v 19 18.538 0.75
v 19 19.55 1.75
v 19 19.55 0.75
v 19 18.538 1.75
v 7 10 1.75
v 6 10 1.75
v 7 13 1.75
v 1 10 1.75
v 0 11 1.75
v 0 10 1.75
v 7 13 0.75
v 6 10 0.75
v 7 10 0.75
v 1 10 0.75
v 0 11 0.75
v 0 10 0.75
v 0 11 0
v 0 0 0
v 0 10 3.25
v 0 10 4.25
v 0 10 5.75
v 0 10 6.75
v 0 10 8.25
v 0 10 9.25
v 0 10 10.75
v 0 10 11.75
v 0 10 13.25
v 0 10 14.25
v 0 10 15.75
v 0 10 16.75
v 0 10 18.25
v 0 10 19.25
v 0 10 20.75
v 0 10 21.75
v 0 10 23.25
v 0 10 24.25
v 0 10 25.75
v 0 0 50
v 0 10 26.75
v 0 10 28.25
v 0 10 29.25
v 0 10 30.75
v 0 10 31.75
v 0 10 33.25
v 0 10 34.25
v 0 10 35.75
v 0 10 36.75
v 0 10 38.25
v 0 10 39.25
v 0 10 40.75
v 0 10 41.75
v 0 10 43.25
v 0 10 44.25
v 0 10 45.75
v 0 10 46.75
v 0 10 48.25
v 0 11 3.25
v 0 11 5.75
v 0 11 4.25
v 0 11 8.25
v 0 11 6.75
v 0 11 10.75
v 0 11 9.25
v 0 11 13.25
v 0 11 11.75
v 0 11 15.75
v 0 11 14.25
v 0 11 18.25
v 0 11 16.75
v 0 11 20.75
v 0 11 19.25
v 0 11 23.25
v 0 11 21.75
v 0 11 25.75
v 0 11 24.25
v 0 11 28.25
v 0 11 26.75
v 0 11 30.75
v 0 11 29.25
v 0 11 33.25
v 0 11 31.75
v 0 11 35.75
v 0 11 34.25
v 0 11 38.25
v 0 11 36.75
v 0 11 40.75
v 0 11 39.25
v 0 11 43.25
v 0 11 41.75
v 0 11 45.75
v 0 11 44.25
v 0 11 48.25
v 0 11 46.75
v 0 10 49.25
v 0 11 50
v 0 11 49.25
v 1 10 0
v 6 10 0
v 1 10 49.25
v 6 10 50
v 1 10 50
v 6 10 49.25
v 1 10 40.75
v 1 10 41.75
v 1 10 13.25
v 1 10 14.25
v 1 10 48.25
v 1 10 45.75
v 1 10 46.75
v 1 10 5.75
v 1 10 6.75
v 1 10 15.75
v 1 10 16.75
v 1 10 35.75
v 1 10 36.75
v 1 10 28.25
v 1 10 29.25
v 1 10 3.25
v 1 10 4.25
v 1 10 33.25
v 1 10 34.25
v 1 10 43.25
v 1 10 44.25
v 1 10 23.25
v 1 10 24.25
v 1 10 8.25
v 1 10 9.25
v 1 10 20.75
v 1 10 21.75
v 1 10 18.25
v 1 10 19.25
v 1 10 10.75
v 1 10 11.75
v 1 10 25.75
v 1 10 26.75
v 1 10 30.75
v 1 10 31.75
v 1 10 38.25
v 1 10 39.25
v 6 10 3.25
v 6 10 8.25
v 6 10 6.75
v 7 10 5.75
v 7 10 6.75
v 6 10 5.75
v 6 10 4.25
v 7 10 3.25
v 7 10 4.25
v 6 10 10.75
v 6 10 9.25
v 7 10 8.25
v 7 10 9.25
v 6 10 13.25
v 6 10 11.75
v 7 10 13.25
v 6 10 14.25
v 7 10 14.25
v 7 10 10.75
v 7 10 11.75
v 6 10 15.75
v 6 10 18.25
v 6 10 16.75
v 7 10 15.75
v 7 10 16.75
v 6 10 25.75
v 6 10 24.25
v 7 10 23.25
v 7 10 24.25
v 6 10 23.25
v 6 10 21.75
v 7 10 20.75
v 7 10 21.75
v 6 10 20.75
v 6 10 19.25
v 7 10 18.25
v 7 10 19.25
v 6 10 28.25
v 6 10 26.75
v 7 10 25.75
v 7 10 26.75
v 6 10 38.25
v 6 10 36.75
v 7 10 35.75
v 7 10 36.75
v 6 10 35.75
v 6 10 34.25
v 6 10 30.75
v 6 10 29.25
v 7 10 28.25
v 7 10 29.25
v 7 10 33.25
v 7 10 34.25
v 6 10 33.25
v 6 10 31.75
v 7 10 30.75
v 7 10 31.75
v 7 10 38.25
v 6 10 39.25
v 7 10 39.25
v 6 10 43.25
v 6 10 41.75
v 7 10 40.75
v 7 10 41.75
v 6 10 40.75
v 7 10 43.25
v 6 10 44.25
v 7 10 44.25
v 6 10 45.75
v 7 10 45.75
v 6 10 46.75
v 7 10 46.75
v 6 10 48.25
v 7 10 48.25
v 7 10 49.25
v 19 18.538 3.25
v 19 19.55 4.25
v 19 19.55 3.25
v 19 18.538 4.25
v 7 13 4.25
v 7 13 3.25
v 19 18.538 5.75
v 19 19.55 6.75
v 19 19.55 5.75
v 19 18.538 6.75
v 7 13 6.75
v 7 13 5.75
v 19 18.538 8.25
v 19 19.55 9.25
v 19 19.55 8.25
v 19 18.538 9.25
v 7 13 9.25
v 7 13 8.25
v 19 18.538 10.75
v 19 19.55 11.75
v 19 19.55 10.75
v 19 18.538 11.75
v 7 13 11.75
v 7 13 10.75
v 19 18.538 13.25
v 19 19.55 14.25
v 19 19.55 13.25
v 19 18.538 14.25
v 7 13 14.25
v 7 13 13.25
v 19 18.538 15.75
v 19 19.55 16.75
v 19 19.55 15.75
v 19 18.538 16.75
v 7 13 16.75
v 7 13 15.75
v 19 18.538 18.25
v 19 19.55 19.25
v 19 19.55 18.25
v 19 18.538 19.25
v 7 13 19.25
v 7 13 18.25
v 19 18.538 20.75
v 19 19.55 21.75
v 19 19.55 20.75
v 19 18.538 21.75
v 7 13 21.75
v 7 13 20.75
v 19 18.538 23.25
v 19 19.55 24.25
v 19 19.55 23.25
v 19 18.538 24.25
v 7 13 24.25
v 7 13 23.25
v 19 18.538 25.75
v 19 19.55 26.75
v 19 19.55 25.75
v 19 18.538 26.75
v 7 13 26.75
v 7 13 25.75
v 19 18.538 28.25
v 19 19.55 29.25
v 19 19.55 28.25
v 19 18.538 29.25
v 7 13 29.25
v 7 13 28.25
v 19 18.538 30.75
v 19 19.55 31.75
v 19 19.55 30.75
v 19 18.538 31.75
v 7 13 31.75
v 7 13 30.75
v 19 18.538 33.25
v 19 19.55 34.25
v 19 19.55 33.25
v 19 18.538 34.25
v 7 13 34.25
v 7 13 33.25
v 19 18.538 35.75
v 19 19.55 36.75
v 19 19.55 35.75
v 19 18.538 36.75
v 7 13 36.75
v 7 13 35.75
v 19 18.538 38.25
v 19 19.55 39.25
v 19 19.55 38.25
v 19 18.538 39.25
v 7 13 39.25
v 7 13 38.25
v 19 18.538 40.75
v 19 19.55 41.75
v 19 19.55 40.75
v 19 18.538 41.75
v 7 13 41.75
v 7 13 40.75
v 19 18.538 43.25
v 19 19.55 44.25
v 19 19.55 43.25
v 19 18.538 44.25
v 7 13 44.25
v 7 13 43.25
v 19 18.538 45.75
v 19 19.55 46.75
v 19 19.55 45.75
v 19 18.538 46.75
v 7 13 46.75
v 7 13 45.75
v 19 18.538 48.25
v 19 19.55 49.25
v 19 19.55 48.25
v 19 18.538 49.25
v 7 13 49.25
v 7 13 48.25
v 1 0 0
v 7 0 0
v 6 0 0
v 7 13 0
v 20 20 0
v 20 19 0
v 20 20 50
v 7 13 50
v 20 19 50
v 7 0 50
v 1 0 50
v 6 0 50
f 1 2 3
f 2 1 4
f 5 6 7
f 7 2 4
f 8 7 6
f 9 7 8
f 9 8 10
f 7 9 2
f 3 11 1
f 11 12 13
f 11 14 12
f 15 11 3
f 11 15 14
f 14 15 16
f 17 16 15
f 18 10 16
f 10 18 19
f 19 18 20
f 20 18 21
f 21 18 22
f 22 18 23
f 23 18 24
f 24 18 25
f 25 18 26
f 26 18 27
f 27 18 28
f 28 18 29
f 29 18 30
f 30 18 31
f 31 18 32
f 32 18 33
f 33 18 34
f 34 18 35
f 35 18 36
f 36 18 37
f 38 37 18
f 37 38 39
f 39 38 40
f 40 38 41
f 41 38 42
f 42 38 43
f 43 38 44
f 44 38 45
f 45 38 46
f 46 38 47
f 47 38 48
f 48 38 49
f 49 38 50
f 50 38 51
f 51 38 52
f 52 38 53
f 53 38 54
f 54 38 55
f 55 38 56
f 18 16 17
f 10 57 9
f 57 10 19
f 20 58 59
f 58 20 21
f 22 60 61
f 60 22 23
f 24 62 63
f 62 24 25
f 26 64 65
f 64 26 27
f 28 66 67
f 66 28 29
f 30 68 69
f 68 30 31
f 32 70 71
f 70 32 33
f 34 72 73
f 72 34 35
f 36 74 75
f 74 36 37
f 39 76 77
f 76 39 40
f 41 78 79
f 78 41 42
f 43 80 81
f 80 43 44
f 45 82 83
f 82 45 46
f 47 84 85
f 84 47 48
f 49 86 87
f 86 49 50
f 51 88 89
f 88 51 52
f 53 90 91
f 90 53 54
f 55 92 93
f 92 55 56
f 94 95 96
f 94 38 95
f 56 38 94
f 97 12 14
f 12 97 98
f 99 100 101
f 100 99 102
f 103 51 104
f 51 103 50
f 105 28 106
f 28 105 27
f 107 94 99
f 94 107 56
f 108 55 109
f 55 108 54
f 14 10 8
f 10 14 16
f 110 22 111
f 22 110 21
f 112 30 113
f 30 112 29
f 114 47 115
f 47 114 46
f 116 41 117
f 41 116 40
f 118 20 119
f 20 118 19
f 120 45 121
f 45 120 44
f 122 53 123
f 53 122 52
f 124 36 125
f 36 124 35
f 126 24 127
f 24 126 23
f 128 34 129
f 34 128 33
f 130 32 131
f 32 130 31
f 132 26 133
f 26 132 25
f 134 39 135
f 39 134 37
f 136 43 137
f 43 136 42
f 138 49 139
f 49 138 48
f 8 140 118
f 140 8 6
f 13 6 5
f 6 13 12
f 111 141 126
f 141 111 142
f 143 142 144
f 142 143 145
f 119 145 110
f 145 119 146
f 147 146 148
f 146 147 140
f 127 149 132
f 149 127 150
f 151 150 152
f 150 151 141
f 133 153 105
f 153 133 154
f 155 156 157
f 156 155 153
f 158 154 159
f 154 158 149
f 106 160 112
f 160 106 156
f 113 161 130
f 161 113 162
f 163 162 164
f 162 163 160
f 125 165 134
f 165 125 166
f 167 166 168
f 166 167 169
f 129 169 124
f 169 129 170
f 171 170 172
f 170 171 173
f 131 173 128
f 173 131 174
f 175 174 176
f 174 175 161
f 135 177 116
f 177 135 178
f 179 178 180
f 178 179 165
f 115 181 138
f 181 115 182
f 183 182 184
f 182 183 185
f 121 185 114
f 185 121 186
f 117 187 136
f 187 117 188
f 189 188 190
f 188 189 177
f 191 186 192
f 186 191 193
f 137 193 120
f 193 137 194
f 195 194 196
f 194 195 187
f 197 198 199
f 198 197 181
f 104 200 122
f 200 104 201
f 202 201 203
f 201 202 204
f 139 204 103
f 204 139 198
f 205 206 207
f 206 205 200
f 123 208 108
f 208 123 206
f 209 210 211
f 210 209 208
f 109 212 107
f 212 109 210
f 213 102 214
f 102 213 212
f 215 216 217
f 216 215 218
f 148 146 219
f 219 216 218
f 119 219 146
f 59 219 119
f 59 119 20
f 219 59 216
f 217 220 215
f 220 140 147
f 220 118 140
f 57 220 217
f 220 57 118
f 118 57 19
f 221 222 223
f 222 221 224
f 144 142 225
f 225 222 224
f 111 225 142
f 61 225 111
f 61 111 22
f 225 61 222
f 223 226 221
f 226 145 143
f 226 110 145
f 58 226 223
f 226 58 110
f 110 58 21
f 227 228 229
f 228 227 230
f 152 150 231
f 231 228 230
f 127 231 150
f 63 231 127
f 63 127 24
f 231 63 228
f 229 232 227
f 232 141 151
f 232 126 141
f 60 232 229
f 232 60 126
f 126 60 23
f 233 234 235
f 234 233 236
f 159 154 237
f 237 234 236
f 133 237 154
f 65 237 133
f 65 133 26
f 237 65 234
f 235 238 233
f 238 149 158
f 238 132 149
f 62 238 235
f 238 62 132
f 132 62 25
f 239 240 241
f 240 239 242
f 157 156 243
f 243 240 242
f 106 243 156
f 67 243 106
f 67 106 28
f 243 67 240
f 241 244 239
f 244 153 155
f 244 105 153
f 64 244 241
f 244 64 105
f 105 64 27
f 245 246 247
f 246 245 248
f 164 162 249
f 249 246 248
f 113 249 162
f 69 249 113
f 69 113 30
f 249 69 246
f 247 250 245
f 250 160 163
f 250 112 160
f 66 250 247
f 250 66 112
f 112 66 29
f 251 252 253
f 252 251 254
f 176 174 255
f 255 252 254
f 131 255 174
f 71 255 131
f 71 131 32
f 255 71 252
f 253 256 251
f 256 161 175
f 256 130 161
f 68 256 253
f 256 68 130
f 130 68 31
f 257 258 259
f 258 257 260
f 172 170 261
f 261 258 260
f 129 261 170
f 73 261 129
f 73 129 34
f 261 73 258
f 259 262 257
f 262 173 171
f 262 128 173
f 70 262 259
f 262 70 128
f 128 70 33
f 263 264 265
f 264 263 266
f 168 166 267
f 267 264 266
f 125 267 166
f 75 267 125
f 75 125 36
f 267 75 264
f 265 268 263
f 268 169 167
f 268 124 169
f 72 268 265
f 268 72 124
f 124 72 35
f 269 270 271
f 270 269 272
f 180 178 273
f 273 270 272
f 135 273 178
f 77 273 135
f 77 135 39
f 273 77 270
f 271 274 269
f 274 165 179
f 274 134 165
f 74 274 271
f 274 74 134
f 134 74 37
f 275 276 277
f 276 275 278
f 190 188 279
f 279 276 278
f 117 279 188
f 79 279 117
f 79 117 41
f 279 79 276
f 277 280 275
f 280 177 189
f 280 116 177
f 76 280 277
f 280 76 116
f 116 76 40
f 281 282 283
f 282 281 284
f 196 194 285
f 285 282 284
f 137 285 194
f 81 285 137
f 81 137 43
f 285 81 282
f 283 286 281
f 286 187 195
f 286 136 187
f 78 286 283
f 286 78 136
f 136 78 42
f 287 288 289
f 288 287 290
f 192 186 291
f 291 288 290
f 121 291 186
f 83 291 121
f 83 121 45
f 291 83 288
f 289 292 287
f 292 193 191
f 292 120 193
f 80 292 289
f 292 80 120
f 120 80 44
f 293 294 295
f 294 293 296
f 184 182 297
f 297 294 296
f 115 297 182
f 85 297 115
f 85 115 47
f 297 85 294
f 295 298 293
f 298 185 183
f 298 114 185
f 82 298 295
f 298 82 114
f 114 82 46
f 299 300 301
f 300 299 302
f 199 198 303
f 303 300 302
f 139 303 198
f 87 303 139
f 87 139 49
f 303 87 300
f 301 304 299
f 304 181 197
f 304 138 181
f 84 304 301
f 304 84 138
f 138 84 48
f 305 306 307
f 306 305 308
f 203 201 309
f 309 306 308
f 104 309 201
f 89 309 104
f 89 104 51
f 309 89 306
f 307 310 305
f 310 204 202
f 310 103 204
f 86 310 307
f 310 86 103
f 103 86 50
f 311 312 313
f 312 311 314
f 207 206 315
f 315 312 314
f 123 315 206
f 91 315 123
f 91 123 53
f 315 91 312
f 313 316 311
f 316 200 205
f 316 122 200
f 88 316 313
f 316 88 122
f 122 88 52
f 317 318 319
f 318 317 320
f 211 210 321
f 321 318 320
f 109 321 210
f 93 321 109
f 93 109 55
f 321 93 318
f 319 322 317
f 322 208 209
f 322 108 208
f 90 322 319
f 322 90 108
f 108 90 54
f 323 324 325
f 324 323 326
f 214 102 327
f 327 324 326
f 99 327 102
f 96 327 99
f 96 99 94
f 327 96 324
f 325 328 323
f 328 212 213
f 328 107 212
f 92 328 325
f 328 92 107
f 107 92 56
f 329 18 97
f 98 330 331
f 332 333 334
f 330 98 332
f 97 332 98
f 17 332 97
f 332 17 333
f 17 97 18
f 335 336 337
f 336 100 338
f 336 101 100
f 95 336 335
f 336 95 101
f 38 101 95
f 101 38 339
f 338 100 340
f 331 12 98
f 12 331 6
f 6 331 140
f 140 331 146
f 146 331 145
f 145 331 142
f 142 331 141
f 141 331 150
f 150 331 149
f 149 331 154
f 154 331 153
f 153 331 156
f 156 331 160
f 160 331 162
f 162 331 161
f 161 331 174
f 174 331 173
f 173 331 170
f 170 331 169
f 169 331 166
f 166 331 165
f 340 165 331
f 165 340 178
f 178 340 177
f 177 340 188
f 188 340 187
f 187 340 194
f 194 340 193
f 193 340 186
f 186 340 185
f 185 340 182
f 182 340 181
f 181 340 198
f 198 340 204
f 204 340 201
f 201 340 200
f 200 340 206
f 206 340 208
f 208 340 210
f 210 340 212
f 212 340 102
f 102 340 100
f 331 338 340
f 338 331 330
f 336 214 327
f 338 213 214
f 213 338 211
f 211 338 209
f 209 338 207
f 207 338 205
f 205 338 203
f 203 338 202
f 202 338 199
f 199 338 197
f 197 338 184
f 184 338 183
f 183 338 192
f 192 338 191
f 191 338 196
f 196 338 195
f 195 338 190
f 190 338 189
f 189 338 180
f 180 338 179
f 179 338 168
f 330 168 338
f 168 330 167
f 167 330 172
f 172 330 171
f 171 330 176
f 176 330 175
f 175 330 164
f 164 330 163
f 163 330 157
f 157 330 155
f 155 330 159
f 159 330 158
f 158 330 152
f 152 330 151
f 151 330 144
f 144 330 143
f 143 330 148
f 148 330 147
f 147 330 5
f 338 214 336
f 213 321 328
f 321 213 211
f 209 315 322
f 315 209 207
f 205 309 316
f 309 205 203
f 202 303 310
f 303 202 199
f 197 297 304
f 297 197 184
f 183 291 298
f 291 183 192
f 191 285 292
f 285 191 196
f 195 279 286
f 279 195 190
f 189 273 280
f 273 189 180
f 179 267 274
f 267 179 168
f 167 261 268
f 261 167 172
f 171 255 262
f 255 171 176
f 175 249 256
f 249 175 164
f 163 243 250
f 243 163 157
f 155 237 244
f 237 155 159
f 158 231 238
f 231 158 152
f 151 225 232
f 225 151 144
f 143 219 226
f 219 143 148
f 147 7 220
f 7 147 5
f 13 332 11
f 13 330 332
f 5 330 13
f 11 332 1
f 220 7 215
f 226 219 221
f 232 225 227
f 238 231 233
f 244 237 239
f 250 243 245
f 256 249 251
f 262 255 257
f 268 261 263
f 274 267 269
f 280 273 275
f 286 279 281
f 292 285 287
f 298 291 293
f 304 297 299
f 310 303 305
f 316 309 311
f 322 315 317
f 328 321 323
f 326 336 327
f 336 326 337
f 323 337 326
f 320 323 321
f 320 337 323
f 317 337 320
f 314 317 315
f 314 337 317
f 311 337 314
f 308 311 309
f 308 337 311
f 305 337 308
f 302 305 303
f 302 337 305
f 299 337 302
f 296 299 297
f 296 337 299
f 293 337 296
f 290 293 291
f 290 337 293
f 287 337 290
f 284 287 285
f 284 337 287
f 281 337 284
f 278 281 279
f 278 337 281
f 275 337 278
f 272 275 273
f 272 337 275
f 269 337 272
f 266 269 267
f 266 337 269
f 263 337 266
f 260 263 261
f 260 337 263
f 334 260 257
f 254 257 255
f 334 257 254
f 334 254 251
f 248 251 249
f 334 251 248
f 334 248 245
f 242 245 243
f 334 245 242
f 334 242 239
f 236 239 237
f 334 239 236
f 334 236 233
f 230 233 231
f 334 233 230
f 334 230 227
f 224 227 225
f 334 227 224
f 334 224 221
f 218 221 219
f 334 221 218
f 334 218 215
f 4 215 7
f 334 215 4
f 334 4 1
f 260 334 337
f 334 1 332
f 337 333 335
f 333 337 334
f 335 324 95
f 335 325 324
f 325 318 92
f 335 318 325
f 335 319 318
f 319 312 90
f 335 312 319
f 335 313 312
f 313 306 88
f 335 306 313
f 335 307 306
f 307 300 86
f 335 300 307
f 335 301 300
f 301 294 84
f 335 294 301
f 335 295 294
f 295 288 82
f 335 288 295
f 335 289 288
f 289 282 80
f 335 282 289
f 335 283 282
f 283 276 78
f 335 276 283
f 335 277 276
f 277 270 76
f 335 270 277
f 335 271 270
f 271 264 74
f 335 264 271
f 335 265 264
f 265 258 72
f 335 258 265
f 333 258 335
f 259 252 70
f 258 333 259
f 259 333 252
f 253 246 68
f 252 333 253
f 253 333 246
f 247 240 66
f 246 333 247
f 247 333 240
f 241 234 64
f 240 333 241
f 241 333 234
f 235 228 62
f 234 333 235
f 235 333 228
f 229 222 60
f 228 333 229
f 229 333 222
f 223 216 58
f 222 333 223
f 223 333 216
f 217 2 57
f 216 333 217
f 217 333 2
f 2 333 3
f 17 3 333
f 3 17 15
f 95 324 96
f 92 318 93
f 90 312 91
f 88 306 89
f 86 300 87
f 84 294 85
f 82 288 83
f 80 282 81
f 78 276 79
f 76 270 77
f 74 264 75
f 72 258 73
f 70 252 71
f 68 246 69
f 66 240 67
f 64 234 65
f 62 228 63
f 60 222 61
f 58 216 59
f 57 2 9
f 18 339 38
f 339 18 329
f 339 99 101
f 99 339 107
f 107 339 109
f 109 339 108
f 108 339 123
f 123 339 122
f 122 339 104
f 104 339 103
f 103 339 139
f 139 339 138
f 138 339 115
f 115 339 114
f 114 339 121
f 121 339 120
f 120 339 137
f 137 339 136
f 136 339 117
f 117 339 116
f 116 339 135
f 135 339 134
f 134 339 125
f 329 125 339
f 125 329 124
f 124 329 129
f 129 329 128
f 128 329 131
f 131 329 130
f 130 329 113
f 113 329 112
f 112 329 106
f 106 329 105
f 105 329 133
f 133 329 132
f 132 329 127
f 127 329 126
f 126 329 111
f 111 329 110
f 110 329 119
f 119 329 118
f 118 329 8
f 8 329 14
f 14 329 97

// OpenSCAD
difference() {
    //cube([50, 5, 10]);
}
module base() polygon([[0,0], [0, 10+1], [20, 20], [20, 20-1], [5+1*2, 13], [5+1*2, 0],
         [5+1, 0], [5+1, 10], [1, 10], [1, 0]]);

h = 50;
n = 20;
difference() {
linear_extrude(height = h) base();
    for (i=[0:n-1]) {
        translate([0, 10, h/n*i+(h/n-1)/2]) cube([19, 99, 1]);
    }
}
